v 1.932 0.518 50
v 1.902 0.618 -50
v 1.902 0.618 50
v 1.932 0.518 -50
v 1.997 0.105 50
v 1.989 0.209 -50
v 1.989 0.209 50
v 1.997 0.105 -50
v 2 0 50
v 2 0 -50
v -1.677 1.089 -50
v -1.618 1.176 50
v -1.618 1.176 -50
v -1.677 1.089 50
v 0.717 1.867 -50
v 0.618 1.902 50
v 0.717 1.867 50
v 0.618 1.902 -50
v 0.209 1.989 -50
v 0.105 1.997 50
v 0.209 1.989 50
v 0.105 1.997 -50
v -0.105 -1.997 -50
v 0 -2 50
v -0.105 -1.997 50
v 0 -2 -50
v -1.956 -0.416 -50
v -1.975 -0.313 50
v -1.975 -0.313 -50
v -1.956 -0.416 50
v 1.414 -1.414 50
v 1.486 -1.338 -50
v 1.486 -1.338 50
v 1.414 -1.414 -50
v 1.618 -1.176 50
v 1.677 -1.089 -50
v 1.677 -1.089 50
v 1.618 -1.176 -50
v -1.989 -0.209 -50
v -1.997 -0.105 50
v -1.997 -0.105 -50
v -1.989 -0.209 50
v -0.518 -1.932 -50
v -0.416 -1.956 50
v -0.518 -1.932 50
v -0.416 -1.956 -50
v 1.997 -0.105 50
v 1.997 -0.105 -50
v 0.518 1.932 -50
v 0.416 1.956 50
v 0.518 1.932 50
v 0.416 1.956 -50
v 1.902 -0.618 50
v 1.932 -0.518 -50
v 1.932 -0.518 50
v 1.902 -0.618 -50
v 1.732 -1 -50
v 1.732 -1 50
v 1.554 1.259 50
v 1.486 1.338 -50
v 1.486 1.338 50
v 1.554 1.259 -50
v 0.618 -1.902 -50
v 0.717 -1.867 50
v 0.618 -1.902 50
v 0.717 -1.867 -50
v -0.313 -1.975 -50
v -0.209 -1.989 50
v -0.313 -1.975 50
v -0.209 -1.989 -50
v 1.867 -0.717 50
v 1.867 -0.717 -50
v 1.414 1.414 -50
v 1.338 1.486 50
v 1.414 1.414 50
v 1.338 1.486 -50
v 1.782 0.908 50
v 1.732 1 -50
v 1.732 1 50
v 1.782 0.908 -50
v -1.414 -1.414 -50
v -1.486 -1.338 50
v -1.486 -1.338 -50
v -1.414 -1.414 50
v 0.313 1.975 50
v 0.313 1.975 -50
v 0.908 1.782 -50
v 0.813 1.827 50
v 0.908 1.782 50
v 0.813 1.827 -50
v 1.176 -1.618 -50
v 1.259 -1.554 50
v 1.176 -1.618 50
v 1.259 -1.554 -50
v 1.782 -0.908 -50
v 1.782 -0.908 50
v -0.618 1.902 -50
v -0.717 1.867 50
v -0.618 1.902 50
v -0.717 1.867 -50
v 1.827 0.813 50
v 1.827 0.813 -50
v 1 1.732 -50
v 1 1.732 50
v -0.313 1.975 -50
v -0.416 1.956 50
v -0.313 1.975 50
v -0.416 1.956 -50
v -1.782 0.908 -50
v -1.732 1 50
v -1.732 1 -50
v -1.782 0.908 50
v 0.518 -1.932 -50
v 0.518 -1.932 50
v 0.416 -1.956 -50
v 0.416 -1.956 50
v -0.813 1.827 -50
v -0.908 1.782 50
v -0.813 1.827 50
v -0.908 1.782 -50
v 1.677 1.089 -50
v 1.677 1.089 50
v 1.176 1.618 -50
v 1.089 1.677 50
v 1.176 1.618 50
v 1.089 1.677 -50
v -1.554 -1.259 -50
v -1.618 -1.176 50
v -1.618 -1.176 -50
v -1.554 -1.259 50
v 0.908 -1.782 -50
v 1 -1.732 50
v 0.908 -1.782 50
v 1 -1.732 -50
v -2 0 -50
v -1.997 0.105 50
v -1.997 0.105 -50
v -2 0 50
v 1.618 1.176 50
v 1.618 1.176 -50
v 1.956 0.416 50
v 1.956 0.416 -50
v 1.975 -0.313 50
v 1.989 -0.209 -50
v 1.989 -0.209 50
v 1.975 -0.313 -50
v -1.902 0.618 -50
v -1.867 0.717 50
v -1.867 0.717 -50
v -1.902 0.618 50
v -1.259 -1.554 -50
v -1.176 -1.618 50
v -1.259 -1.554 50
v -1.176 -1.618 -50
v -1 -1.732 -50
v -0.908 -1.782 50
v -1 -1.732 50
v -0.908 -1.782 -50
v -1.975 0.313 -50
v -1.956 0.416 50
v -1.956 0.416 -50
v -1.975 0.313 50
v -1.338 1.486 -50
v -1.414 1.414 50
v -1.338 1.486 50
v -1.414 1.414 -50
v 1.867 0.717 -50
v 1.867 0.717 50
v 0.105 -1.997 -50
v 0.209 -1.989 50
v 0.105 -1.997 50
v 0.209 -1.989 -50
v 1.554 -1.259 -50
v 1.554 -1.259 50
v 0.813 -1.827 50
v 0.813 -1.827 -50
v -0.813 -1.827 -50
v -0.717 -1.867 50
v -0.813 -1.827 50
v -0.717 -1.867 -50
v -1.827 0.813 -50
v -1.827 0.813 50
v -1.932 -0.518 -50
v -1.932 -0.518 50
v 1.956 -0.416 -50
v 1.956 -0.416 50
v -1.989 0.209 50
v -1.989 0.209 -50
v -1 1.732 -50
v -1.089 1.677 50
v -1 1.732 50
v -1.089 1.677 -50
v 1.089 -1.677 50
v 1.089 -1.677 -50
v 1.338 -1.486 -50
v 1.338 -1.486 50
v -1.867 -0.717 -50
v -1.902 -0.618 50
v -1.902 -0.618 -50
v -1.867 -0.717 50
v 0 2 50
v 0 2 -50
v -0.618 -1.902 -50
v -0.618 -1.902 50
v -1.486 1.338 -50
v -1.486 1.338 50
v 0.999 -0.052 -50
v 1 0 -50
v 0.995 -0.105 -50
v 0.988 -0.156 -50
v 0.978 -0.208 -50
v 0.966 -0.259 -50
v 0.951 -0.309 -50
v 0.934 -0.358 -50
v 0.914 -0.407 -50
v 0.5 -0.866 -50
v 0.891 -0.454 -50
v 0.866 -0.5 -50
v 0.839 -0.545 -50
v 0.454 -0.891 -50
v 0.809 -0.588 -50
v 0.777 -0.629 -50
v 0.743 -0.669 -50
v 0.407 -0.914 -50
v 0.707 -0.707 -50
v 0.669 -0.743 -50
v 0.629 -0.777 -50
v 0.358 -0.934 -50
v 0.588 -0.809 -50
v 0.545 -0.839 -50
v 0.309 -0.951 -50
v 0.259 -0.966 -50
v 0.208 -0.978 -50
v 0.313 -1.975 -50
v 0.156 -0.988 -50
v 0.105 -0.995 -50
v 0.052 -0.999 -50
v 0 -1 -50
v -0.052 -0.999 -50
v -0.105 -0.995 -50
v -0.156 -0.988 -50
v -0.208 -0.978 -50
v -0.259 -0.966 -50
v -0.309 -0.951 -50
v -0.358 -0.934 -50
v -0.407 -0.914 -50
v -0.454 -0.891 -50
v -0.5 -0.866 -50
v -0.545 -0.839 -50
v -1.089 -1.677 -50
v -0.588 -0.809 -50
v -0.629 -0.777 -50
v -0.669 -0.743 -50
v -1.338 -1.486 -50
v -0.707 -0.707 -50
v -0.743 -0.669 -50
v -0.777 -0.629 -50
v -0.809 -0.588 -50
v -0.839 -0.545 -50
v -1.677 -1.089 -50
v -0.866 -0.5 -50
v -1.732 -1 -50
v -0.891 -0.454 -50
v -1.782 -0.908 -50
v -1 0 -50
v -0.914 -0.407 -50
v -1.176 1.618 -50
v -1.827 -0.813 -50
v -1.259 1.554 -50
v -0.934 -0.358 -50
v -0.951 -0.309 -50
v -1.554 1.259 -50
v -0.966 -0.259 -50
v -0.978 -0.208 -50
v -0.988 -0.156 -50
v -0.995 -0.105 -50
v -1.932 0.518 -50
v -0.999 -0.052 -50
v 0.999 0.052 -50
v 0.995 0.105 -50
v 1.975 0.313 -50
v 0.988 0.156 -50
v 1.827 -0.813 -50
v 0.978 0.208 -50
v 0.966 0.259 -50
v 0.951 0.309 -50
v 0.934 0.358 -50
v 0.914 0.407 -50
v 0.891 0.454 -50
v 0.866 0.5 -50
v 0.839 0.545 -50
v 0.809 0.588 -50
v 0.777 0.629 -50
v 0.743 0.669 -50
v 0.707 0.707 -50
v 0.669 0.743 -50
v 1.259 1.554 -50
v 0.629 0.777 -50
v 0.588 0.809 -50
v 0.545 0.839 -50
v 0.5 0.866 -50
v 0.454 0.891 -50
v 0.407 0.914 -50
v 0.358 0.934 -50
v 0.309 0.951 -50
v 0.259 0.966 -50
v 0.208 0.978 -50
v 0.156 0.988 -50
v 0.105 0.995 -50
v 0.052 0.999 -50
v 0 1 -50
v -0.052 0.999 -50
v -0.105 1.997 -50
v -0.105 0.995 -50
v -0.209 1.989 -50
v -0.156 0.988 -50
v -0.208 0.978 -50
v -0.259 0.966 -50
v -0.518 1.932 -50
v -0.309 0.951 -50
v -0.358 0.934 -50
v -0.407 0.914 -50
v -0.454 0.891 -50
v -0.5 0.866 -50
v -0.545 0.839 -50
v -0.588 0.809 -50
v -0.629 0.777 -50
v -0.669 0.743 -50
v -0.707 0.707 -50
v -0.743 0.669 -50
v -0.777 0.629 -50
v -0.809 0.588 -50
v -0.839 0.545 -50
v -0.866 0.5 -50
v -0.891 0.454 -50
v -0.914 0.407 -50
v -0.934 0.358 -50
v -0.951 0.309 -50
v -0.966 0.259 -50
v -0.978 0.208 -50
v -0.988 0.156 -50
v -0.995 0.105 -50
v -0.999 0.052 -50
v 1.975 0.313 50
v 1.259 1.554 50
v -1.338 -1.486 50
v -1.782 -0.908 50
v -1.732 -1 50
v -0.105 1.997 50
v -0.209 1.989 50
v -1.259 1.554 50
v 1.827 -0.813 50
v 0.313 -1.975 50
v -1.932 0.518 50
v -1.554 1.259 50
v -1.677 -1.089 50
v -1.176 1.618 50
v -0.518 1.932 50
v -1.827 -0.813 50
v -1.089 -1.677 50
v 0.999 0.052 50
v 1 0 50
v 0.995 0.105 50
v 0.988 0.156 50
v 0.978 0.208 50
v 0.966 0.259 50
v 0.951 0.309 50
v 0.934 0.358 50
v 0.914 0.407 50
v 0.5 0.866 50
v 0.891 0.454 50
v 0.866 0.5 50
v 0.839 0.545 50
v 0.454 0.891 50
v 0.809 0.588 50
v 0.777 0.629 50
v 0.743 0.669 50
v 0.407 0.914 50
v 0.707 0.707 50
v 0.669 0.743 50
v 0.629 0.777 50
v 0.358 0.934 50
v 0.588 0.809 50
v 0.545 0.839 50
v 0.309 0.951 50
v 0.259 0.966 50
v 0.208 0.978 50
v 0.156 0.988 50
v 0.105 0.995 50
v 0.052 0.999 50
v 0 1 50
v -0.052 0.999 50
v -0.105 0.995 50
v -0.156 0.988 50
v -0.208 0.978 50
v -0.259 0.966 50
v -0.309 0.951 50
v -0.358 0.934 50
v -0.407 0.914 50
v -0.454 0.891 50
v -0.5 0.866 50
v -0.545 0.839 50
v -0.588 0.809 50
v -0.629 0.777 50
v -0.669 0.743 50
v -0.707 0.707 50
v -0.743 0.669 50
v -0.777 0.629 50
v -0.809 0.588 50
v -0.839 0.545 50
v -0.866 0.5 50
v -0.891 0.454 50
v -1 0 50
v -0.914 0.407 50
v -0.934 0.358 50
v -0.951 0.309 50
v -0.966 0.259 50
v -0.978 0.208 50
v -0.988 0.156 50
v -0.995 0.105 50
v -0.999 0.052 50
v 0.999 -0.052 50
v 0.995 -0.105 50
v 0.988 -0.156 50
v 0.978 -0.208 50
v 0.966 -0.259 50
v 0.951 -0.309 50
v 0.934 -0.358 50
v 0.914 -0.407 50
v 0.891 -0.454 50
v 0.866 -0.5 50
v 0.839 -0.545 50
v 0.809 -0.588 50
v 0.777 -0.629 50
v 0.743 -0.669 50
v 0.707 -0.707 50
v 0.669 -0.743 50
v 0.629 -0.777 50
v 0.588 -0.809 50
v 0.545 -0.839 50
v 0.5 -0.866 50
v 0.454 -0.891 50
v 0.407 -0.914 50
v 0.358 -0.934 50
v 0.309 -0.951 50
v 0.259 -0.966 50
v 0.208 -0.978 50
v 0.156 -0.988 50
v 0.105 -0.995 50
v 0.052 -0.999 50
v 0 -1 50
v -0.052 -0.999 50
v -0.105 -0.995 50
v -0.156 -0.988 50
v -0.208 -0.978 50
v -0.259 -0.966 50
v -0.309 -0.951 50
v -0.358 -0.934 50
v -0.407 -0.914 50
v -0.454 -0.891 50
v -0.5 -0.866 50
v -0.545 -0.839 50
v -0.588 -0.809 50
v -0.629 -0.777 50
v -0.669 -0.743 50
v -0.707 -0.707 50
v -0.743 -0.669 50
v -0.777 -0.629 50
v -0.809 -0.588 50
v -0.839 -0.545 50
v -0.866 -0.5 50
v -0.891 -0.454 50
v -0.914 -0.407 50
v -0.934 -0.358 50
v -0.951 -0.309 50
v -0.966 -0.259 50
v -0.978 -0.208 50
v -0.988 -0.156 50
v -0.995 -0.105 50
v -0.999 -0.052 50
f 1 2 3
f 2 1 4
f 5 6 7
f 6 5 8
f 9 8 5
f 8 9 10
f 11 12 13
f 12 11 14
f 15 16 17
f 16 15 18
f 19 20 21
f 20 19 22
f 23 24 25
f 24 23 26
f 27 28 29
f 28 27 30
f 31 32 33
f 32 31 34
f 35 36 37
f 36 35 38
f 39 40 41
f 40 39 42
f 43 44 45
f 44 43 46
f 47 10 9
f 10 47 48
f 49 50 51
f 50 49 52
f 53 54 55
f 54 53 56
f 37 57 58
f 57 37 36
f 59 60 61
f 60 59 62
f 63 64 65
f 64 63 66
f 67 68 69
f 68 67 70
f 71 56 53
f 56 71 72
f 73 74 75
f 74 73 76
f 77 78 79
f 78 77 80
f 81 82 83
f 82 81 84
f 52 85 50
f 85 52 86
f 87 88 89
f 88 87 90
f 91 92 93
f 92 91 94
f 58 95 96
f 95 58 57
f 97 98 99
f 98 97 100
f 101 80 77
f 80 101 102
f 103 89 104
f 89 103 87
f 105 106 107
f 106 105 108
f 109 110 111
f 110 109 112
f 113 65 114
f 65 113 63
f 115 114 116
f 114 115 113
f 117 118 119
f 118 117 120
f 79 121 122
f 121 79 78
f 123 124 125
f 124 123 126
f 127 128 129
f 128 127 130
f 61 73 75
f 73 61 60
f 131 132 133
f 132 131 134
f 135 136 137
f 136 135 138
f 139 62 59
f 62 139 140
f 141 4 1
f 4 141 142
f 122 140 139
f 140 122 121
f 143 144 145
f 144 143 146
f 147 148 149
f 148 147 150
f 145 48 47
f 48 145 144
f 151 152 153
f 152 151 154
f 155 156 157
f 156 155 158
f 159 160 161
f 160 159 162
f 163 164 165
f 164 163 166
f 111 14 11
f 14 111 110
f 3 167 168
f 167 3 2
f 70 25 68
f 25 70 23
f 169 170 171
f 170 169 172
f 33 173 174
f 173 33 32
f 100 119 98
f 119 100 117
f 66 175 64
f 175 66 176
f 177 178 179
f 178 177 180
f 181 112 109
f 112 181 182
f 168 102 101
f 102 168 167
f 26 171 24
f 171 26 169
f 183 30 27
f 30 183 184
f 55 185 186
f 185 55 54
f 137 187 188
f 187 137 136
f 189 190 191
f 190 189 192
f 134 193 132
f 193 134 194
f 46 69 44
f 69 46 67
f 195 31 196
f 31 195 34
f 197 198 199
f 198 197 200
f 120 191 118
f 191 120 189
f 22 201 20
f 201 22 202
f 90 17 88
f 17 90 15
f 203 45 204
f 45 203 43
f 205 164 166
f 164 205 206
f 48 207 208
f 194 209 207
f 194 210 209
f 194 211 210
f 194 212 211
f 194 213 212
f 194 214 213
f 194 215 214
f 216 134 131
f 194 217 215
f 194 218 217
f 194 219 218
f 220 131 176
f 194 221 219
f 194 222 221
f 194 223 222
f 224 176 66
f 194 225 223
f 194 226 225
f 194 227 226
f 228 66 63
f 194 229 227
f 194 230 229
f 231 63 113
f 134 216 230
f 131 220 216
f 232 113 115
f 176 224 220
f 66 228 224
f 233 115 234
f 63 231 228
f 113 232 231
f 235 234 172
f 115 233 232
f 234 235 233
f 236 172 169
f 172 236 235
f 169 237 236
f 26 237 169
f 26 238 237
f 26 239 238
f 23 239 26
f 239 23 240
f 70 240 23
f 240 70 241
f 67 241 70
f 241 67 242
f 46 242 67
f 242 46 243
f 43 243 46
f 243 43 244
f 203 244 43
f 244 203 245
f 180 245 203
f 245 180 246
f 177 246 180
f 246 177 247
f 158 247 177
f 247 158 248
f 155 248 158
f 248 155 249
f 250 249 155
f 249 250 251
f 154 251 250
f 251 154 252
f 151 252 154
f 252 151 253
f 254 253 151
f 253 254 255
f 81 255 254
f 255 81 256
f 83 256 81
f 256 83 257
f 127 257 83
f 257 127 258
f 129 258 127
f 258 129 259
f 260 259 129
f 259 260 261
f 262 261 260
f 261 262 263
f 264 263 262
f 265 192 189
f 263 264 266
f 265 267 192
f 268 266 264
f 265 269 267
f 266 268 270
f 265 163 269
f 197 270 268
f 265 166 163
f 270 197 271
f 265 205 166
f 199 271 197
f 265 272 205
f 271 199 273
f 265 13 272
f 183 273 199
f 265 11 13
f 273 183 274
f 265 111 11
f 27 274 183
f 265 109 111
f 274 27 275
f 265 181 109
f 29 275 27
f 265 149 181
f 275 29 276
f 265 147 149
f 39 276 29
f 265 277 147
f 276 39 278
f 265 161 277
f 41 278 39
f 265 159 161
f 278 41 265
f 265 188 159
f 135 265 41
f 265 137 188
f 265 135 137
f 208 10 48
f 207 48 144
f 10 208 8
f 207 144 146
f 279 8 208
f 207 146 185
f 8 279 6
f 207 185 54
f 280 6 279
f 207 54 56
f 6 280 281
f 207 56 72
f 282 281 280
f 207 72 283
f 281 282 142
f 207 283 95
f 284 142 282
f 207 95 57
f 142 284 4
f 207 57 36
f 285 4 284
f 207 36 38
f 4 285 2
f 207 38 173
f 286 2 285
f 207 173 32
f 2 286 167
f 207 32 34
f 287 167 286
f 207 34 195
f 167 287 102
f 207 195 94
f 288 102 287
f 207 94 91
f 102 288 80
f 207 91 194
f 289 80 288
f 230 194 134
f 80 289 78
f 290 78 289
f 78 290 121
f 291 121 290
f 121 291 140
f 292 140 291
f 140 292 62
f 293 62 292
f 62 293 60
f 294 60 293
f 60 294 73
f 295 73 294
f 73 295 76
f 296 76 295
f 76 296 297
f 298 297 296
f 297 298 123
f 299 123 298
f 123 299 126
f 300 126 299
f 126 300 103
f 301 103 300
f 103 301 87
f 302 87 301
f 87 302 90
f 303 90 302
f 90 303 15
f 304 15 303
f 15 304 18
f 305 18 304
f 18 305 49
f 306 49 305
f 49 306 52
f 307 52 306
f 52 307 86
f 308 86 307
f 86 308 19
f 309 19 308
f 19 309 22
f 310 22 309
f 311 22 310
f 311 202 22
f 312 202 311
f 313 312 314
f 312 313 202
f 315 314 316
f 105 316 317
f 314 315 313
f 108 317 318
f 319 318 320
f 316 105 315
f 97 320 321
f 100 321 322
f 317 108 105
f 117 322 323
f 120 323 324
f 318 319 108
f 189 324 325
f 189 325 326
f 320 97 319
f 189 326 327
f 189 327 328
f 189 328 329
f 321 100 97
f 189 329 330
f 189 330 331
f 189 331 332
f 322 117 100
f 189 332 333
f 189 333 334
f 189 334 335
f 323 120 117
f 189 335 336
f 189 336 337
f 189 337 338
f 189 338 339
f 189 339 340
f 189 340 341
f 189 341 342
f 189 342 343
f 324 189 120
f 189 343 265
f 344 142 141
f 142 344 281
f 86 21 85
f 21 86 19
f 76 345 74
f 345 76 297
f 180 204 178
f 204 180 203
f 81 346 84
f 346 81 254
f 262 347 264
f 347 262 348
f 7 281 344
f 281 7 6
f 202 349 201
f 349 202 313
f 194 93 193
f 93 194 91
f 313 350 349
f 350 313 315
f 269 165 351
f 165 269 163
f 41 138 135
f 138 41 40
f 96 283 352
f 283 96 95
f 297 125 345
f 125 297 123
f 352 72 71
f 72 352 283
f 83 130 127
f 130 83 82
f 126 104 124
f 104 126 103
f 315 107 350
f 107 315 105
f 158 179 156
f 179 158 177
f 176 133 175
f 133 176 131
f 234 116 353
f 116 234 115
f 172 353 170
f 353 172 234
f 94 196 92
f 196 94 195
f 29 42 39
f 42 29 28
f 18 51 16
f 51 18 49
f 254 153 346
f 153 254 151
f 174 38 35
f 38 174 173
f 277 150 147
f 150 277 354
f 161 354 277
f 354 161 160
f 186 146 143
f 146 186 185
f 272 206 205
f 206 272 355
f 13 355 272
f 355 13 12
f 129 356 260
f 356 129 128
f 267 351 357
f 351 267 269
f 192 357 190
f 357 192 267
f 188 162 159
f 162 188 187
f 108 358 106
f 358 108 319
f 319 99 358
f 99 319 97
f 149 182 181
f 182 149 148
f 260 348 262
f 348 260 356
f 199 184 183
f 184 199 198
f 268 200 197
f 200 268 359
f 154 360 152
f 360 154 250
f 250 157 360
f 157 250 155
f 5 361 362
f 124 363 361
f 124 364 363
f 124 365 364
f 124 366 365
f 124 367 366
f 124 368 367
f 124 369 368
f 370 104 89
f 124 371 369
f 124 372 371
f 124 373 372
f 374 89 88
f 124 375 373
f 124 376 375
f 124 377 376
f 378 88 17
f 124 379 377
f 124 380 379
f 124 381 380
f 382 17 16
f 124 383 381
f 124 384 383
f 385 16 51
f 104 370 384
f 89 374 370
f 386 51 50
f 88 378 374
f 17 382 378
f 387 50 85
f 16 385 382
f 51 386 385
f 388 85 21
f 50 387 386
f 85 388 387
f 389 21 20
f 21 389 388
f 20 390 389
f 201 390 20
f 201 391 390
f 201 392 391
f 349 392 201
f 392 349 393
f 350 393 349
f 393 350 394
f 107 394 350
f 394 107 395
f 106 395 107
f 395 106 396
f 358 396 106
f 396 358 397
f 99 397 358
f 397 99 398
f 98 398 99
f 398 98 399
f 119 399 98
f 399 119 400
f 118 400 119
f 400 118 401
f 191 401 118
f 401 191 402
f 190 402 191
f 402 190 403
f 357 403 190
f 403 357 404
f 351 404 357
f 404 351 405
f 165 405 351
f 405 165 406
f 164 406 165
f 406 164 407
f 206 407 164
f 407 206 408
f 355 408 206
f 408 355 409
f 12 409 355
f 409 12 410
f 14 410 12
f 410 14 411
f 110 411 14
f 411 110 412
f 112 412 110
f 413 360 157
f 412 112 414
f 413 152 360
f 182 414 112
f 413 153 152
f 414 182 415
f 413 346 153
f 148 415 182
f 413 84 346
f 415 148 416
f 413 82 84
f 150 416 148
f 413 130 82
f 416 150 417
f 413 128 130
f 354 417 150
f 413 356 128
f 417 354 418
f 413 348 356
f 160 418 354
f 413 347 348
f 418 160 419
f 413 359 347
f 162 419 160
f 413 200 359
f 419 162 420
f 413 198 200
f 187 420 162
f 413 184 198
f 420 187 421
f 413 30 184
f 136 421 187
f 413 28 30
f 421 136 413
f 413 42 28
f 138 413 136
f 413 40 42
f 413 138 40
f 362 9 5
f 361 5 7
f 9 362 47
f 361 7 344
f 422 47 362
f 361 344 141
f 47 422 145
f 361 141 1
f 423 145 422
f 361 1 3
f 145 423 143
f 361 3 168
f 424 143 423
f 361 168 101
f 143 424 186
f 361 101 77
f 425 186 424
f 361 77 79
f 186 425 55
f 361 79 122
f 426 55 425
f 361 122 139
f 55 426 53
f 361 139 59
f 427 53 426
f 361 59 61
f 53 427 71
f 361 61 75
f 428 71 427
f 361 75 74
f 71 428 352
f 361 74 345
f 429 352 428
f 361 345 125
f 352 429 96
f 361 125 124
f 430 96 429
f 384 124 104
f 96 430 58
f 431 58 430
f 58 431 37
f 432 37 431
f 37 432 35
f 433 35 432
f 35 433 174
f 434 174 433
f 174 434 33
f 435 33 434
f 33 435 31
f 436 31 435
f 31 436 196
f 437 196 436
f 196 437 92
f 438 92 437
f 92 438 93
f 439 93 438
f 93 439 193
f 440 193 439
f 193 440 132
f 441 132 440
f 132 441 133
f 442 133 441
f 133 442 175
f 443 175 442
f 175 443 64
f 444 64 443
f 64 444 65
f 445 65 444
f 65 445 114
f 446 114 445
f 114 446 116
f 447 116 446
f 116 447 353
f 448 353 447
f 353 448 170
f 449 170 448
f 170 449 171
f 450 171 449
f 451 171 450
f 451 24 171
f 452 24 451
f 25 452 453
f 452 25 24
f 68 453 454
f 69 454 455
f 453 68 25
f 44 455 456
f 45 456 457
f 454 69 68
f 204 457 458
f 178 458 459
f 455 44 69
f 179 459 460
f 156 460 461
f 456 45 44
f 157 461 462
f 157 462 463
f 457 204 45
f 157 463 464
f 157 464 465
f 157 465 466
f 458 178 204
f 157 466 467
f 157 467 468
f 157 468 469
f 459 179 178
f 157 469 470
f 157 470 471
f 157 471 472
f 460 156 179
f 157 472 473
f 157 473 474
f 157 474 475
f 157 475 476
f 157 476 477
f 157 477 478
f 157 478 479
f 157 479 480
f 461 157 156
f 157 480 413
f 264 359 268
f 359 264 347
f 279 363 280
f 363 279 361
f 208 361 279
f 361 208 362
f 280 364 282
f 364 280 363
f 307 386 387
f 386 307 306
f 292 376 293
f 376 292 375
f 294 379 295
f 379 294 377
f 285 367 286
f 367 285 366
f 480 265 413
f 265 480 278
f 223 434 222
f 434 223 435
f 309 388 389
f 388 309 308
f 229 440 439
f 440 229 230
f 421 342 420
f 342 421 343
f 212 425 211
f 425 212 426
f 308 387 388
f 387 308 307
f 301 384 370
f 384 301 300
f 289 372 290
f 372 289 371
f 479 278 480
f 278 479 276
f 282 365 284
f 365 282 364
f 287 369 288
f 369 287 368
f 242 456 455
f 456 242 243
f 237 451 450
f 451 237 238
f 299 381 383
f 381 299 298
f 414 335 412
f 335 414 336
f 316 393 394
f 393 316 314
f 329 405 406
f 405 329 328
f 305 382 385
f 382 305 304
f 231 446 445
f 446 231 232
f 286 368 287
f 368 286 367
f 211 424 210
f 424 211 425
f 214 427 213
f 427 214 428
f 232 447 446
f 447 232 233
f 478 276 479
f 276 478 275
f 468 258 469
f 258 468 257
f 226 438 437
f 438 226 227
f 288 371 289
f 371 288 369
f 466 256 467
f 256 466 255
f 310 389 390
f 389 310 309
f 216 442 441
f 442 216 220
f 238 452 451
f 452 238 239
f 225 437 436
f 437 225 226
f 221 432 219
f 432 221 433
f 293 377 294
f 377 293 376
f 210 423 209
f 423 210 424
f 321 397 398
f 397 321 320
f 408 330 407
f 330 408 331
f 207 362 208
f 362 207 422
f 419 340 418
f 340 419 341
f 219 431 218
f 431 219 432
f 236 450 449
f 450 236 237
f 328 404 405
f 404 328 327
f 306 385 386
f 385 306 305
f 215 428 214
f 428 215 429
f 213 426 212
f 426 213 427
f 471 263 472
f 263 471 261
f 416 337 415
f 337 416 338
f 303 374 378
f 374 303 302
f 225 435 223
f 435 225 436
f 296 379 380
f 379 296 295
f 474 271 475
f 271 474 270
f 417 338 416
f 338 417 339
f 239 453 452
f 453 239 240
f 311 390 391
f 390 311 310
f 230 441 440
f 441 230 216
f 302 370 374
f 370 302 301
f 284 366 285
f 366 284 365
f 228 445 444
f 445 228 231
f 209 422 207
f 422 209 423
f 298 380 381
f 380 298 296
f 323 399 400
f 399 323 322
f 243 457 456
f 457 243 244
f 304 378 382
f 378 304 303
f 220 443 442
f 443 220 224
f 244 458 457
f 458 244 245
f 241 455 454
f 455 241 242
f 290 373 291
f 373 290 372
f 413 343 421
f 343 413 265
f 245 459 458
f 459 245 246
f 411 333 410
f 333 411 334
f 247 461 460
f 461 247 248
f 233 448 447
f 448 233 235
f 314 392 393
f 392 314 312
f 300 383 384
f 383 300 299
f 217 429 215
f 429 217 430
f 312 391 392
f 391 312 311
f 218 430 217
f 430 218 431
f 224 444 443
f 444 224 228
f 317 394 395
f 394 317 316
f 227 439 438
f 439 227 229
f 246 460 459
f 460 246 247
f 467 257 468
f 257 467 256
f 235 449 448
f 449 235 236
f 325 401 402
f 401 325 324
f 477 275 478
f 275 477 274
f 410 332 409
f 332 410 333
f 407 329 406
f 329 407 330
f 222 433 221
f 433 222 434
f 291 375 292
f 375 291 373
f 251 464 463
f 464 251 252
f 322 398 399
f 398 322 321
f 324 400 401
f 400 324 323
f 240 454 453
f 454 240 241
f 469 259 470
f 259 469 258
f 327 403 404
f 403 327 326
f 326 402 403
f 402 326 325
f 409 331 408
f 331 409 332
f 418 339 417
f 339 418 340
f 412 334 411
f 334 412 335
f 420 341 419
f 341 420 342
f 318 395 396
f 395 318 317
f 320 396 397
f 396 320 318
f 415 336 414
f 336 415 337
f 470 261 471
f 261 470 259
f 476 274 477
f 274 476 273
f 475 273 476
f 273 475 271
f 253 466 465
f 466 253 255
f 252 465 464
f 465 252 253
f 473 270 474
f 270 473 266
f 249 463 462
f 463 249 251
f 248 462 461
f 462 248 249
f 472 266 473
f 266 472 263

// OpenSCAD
// PTFE Tubing Model (connected solid with hollow bore)

// Parameters
length = 100;          // mm
outer_diameter = 4;    // mm
inner_diameter = 2;    // mm

// Optional parameter for forced internal diameter
forced_inner_diameter = -1; // Set to -1 to use default inner diameter

// Resolution
$fn = 120;

// Small overlap to ensure robust boolean operations
eps = 0.2;

// Function to determine the actual inner diameter (clamped to be < outer)
function get_inner_diameter() =
    let(id = (forced_inner_diameter > 0) ? forced_inner_diameter : inner_diameter)
    min(id, outer_diameter - 2*eps);

// Main module to create the PTFE tubing
module tubing() {
    difference() {
        // Outer body (centered for consistent views)
        cylinder(h = length, d = outer_diameter, center = true);

        // Hollow bore (slightly longer to guarantee through-cut)
        cylinder(h = length + 2*eps, d = get_inner_diameter(), center = true);
    }
}

// Render the tubing
tubing();
